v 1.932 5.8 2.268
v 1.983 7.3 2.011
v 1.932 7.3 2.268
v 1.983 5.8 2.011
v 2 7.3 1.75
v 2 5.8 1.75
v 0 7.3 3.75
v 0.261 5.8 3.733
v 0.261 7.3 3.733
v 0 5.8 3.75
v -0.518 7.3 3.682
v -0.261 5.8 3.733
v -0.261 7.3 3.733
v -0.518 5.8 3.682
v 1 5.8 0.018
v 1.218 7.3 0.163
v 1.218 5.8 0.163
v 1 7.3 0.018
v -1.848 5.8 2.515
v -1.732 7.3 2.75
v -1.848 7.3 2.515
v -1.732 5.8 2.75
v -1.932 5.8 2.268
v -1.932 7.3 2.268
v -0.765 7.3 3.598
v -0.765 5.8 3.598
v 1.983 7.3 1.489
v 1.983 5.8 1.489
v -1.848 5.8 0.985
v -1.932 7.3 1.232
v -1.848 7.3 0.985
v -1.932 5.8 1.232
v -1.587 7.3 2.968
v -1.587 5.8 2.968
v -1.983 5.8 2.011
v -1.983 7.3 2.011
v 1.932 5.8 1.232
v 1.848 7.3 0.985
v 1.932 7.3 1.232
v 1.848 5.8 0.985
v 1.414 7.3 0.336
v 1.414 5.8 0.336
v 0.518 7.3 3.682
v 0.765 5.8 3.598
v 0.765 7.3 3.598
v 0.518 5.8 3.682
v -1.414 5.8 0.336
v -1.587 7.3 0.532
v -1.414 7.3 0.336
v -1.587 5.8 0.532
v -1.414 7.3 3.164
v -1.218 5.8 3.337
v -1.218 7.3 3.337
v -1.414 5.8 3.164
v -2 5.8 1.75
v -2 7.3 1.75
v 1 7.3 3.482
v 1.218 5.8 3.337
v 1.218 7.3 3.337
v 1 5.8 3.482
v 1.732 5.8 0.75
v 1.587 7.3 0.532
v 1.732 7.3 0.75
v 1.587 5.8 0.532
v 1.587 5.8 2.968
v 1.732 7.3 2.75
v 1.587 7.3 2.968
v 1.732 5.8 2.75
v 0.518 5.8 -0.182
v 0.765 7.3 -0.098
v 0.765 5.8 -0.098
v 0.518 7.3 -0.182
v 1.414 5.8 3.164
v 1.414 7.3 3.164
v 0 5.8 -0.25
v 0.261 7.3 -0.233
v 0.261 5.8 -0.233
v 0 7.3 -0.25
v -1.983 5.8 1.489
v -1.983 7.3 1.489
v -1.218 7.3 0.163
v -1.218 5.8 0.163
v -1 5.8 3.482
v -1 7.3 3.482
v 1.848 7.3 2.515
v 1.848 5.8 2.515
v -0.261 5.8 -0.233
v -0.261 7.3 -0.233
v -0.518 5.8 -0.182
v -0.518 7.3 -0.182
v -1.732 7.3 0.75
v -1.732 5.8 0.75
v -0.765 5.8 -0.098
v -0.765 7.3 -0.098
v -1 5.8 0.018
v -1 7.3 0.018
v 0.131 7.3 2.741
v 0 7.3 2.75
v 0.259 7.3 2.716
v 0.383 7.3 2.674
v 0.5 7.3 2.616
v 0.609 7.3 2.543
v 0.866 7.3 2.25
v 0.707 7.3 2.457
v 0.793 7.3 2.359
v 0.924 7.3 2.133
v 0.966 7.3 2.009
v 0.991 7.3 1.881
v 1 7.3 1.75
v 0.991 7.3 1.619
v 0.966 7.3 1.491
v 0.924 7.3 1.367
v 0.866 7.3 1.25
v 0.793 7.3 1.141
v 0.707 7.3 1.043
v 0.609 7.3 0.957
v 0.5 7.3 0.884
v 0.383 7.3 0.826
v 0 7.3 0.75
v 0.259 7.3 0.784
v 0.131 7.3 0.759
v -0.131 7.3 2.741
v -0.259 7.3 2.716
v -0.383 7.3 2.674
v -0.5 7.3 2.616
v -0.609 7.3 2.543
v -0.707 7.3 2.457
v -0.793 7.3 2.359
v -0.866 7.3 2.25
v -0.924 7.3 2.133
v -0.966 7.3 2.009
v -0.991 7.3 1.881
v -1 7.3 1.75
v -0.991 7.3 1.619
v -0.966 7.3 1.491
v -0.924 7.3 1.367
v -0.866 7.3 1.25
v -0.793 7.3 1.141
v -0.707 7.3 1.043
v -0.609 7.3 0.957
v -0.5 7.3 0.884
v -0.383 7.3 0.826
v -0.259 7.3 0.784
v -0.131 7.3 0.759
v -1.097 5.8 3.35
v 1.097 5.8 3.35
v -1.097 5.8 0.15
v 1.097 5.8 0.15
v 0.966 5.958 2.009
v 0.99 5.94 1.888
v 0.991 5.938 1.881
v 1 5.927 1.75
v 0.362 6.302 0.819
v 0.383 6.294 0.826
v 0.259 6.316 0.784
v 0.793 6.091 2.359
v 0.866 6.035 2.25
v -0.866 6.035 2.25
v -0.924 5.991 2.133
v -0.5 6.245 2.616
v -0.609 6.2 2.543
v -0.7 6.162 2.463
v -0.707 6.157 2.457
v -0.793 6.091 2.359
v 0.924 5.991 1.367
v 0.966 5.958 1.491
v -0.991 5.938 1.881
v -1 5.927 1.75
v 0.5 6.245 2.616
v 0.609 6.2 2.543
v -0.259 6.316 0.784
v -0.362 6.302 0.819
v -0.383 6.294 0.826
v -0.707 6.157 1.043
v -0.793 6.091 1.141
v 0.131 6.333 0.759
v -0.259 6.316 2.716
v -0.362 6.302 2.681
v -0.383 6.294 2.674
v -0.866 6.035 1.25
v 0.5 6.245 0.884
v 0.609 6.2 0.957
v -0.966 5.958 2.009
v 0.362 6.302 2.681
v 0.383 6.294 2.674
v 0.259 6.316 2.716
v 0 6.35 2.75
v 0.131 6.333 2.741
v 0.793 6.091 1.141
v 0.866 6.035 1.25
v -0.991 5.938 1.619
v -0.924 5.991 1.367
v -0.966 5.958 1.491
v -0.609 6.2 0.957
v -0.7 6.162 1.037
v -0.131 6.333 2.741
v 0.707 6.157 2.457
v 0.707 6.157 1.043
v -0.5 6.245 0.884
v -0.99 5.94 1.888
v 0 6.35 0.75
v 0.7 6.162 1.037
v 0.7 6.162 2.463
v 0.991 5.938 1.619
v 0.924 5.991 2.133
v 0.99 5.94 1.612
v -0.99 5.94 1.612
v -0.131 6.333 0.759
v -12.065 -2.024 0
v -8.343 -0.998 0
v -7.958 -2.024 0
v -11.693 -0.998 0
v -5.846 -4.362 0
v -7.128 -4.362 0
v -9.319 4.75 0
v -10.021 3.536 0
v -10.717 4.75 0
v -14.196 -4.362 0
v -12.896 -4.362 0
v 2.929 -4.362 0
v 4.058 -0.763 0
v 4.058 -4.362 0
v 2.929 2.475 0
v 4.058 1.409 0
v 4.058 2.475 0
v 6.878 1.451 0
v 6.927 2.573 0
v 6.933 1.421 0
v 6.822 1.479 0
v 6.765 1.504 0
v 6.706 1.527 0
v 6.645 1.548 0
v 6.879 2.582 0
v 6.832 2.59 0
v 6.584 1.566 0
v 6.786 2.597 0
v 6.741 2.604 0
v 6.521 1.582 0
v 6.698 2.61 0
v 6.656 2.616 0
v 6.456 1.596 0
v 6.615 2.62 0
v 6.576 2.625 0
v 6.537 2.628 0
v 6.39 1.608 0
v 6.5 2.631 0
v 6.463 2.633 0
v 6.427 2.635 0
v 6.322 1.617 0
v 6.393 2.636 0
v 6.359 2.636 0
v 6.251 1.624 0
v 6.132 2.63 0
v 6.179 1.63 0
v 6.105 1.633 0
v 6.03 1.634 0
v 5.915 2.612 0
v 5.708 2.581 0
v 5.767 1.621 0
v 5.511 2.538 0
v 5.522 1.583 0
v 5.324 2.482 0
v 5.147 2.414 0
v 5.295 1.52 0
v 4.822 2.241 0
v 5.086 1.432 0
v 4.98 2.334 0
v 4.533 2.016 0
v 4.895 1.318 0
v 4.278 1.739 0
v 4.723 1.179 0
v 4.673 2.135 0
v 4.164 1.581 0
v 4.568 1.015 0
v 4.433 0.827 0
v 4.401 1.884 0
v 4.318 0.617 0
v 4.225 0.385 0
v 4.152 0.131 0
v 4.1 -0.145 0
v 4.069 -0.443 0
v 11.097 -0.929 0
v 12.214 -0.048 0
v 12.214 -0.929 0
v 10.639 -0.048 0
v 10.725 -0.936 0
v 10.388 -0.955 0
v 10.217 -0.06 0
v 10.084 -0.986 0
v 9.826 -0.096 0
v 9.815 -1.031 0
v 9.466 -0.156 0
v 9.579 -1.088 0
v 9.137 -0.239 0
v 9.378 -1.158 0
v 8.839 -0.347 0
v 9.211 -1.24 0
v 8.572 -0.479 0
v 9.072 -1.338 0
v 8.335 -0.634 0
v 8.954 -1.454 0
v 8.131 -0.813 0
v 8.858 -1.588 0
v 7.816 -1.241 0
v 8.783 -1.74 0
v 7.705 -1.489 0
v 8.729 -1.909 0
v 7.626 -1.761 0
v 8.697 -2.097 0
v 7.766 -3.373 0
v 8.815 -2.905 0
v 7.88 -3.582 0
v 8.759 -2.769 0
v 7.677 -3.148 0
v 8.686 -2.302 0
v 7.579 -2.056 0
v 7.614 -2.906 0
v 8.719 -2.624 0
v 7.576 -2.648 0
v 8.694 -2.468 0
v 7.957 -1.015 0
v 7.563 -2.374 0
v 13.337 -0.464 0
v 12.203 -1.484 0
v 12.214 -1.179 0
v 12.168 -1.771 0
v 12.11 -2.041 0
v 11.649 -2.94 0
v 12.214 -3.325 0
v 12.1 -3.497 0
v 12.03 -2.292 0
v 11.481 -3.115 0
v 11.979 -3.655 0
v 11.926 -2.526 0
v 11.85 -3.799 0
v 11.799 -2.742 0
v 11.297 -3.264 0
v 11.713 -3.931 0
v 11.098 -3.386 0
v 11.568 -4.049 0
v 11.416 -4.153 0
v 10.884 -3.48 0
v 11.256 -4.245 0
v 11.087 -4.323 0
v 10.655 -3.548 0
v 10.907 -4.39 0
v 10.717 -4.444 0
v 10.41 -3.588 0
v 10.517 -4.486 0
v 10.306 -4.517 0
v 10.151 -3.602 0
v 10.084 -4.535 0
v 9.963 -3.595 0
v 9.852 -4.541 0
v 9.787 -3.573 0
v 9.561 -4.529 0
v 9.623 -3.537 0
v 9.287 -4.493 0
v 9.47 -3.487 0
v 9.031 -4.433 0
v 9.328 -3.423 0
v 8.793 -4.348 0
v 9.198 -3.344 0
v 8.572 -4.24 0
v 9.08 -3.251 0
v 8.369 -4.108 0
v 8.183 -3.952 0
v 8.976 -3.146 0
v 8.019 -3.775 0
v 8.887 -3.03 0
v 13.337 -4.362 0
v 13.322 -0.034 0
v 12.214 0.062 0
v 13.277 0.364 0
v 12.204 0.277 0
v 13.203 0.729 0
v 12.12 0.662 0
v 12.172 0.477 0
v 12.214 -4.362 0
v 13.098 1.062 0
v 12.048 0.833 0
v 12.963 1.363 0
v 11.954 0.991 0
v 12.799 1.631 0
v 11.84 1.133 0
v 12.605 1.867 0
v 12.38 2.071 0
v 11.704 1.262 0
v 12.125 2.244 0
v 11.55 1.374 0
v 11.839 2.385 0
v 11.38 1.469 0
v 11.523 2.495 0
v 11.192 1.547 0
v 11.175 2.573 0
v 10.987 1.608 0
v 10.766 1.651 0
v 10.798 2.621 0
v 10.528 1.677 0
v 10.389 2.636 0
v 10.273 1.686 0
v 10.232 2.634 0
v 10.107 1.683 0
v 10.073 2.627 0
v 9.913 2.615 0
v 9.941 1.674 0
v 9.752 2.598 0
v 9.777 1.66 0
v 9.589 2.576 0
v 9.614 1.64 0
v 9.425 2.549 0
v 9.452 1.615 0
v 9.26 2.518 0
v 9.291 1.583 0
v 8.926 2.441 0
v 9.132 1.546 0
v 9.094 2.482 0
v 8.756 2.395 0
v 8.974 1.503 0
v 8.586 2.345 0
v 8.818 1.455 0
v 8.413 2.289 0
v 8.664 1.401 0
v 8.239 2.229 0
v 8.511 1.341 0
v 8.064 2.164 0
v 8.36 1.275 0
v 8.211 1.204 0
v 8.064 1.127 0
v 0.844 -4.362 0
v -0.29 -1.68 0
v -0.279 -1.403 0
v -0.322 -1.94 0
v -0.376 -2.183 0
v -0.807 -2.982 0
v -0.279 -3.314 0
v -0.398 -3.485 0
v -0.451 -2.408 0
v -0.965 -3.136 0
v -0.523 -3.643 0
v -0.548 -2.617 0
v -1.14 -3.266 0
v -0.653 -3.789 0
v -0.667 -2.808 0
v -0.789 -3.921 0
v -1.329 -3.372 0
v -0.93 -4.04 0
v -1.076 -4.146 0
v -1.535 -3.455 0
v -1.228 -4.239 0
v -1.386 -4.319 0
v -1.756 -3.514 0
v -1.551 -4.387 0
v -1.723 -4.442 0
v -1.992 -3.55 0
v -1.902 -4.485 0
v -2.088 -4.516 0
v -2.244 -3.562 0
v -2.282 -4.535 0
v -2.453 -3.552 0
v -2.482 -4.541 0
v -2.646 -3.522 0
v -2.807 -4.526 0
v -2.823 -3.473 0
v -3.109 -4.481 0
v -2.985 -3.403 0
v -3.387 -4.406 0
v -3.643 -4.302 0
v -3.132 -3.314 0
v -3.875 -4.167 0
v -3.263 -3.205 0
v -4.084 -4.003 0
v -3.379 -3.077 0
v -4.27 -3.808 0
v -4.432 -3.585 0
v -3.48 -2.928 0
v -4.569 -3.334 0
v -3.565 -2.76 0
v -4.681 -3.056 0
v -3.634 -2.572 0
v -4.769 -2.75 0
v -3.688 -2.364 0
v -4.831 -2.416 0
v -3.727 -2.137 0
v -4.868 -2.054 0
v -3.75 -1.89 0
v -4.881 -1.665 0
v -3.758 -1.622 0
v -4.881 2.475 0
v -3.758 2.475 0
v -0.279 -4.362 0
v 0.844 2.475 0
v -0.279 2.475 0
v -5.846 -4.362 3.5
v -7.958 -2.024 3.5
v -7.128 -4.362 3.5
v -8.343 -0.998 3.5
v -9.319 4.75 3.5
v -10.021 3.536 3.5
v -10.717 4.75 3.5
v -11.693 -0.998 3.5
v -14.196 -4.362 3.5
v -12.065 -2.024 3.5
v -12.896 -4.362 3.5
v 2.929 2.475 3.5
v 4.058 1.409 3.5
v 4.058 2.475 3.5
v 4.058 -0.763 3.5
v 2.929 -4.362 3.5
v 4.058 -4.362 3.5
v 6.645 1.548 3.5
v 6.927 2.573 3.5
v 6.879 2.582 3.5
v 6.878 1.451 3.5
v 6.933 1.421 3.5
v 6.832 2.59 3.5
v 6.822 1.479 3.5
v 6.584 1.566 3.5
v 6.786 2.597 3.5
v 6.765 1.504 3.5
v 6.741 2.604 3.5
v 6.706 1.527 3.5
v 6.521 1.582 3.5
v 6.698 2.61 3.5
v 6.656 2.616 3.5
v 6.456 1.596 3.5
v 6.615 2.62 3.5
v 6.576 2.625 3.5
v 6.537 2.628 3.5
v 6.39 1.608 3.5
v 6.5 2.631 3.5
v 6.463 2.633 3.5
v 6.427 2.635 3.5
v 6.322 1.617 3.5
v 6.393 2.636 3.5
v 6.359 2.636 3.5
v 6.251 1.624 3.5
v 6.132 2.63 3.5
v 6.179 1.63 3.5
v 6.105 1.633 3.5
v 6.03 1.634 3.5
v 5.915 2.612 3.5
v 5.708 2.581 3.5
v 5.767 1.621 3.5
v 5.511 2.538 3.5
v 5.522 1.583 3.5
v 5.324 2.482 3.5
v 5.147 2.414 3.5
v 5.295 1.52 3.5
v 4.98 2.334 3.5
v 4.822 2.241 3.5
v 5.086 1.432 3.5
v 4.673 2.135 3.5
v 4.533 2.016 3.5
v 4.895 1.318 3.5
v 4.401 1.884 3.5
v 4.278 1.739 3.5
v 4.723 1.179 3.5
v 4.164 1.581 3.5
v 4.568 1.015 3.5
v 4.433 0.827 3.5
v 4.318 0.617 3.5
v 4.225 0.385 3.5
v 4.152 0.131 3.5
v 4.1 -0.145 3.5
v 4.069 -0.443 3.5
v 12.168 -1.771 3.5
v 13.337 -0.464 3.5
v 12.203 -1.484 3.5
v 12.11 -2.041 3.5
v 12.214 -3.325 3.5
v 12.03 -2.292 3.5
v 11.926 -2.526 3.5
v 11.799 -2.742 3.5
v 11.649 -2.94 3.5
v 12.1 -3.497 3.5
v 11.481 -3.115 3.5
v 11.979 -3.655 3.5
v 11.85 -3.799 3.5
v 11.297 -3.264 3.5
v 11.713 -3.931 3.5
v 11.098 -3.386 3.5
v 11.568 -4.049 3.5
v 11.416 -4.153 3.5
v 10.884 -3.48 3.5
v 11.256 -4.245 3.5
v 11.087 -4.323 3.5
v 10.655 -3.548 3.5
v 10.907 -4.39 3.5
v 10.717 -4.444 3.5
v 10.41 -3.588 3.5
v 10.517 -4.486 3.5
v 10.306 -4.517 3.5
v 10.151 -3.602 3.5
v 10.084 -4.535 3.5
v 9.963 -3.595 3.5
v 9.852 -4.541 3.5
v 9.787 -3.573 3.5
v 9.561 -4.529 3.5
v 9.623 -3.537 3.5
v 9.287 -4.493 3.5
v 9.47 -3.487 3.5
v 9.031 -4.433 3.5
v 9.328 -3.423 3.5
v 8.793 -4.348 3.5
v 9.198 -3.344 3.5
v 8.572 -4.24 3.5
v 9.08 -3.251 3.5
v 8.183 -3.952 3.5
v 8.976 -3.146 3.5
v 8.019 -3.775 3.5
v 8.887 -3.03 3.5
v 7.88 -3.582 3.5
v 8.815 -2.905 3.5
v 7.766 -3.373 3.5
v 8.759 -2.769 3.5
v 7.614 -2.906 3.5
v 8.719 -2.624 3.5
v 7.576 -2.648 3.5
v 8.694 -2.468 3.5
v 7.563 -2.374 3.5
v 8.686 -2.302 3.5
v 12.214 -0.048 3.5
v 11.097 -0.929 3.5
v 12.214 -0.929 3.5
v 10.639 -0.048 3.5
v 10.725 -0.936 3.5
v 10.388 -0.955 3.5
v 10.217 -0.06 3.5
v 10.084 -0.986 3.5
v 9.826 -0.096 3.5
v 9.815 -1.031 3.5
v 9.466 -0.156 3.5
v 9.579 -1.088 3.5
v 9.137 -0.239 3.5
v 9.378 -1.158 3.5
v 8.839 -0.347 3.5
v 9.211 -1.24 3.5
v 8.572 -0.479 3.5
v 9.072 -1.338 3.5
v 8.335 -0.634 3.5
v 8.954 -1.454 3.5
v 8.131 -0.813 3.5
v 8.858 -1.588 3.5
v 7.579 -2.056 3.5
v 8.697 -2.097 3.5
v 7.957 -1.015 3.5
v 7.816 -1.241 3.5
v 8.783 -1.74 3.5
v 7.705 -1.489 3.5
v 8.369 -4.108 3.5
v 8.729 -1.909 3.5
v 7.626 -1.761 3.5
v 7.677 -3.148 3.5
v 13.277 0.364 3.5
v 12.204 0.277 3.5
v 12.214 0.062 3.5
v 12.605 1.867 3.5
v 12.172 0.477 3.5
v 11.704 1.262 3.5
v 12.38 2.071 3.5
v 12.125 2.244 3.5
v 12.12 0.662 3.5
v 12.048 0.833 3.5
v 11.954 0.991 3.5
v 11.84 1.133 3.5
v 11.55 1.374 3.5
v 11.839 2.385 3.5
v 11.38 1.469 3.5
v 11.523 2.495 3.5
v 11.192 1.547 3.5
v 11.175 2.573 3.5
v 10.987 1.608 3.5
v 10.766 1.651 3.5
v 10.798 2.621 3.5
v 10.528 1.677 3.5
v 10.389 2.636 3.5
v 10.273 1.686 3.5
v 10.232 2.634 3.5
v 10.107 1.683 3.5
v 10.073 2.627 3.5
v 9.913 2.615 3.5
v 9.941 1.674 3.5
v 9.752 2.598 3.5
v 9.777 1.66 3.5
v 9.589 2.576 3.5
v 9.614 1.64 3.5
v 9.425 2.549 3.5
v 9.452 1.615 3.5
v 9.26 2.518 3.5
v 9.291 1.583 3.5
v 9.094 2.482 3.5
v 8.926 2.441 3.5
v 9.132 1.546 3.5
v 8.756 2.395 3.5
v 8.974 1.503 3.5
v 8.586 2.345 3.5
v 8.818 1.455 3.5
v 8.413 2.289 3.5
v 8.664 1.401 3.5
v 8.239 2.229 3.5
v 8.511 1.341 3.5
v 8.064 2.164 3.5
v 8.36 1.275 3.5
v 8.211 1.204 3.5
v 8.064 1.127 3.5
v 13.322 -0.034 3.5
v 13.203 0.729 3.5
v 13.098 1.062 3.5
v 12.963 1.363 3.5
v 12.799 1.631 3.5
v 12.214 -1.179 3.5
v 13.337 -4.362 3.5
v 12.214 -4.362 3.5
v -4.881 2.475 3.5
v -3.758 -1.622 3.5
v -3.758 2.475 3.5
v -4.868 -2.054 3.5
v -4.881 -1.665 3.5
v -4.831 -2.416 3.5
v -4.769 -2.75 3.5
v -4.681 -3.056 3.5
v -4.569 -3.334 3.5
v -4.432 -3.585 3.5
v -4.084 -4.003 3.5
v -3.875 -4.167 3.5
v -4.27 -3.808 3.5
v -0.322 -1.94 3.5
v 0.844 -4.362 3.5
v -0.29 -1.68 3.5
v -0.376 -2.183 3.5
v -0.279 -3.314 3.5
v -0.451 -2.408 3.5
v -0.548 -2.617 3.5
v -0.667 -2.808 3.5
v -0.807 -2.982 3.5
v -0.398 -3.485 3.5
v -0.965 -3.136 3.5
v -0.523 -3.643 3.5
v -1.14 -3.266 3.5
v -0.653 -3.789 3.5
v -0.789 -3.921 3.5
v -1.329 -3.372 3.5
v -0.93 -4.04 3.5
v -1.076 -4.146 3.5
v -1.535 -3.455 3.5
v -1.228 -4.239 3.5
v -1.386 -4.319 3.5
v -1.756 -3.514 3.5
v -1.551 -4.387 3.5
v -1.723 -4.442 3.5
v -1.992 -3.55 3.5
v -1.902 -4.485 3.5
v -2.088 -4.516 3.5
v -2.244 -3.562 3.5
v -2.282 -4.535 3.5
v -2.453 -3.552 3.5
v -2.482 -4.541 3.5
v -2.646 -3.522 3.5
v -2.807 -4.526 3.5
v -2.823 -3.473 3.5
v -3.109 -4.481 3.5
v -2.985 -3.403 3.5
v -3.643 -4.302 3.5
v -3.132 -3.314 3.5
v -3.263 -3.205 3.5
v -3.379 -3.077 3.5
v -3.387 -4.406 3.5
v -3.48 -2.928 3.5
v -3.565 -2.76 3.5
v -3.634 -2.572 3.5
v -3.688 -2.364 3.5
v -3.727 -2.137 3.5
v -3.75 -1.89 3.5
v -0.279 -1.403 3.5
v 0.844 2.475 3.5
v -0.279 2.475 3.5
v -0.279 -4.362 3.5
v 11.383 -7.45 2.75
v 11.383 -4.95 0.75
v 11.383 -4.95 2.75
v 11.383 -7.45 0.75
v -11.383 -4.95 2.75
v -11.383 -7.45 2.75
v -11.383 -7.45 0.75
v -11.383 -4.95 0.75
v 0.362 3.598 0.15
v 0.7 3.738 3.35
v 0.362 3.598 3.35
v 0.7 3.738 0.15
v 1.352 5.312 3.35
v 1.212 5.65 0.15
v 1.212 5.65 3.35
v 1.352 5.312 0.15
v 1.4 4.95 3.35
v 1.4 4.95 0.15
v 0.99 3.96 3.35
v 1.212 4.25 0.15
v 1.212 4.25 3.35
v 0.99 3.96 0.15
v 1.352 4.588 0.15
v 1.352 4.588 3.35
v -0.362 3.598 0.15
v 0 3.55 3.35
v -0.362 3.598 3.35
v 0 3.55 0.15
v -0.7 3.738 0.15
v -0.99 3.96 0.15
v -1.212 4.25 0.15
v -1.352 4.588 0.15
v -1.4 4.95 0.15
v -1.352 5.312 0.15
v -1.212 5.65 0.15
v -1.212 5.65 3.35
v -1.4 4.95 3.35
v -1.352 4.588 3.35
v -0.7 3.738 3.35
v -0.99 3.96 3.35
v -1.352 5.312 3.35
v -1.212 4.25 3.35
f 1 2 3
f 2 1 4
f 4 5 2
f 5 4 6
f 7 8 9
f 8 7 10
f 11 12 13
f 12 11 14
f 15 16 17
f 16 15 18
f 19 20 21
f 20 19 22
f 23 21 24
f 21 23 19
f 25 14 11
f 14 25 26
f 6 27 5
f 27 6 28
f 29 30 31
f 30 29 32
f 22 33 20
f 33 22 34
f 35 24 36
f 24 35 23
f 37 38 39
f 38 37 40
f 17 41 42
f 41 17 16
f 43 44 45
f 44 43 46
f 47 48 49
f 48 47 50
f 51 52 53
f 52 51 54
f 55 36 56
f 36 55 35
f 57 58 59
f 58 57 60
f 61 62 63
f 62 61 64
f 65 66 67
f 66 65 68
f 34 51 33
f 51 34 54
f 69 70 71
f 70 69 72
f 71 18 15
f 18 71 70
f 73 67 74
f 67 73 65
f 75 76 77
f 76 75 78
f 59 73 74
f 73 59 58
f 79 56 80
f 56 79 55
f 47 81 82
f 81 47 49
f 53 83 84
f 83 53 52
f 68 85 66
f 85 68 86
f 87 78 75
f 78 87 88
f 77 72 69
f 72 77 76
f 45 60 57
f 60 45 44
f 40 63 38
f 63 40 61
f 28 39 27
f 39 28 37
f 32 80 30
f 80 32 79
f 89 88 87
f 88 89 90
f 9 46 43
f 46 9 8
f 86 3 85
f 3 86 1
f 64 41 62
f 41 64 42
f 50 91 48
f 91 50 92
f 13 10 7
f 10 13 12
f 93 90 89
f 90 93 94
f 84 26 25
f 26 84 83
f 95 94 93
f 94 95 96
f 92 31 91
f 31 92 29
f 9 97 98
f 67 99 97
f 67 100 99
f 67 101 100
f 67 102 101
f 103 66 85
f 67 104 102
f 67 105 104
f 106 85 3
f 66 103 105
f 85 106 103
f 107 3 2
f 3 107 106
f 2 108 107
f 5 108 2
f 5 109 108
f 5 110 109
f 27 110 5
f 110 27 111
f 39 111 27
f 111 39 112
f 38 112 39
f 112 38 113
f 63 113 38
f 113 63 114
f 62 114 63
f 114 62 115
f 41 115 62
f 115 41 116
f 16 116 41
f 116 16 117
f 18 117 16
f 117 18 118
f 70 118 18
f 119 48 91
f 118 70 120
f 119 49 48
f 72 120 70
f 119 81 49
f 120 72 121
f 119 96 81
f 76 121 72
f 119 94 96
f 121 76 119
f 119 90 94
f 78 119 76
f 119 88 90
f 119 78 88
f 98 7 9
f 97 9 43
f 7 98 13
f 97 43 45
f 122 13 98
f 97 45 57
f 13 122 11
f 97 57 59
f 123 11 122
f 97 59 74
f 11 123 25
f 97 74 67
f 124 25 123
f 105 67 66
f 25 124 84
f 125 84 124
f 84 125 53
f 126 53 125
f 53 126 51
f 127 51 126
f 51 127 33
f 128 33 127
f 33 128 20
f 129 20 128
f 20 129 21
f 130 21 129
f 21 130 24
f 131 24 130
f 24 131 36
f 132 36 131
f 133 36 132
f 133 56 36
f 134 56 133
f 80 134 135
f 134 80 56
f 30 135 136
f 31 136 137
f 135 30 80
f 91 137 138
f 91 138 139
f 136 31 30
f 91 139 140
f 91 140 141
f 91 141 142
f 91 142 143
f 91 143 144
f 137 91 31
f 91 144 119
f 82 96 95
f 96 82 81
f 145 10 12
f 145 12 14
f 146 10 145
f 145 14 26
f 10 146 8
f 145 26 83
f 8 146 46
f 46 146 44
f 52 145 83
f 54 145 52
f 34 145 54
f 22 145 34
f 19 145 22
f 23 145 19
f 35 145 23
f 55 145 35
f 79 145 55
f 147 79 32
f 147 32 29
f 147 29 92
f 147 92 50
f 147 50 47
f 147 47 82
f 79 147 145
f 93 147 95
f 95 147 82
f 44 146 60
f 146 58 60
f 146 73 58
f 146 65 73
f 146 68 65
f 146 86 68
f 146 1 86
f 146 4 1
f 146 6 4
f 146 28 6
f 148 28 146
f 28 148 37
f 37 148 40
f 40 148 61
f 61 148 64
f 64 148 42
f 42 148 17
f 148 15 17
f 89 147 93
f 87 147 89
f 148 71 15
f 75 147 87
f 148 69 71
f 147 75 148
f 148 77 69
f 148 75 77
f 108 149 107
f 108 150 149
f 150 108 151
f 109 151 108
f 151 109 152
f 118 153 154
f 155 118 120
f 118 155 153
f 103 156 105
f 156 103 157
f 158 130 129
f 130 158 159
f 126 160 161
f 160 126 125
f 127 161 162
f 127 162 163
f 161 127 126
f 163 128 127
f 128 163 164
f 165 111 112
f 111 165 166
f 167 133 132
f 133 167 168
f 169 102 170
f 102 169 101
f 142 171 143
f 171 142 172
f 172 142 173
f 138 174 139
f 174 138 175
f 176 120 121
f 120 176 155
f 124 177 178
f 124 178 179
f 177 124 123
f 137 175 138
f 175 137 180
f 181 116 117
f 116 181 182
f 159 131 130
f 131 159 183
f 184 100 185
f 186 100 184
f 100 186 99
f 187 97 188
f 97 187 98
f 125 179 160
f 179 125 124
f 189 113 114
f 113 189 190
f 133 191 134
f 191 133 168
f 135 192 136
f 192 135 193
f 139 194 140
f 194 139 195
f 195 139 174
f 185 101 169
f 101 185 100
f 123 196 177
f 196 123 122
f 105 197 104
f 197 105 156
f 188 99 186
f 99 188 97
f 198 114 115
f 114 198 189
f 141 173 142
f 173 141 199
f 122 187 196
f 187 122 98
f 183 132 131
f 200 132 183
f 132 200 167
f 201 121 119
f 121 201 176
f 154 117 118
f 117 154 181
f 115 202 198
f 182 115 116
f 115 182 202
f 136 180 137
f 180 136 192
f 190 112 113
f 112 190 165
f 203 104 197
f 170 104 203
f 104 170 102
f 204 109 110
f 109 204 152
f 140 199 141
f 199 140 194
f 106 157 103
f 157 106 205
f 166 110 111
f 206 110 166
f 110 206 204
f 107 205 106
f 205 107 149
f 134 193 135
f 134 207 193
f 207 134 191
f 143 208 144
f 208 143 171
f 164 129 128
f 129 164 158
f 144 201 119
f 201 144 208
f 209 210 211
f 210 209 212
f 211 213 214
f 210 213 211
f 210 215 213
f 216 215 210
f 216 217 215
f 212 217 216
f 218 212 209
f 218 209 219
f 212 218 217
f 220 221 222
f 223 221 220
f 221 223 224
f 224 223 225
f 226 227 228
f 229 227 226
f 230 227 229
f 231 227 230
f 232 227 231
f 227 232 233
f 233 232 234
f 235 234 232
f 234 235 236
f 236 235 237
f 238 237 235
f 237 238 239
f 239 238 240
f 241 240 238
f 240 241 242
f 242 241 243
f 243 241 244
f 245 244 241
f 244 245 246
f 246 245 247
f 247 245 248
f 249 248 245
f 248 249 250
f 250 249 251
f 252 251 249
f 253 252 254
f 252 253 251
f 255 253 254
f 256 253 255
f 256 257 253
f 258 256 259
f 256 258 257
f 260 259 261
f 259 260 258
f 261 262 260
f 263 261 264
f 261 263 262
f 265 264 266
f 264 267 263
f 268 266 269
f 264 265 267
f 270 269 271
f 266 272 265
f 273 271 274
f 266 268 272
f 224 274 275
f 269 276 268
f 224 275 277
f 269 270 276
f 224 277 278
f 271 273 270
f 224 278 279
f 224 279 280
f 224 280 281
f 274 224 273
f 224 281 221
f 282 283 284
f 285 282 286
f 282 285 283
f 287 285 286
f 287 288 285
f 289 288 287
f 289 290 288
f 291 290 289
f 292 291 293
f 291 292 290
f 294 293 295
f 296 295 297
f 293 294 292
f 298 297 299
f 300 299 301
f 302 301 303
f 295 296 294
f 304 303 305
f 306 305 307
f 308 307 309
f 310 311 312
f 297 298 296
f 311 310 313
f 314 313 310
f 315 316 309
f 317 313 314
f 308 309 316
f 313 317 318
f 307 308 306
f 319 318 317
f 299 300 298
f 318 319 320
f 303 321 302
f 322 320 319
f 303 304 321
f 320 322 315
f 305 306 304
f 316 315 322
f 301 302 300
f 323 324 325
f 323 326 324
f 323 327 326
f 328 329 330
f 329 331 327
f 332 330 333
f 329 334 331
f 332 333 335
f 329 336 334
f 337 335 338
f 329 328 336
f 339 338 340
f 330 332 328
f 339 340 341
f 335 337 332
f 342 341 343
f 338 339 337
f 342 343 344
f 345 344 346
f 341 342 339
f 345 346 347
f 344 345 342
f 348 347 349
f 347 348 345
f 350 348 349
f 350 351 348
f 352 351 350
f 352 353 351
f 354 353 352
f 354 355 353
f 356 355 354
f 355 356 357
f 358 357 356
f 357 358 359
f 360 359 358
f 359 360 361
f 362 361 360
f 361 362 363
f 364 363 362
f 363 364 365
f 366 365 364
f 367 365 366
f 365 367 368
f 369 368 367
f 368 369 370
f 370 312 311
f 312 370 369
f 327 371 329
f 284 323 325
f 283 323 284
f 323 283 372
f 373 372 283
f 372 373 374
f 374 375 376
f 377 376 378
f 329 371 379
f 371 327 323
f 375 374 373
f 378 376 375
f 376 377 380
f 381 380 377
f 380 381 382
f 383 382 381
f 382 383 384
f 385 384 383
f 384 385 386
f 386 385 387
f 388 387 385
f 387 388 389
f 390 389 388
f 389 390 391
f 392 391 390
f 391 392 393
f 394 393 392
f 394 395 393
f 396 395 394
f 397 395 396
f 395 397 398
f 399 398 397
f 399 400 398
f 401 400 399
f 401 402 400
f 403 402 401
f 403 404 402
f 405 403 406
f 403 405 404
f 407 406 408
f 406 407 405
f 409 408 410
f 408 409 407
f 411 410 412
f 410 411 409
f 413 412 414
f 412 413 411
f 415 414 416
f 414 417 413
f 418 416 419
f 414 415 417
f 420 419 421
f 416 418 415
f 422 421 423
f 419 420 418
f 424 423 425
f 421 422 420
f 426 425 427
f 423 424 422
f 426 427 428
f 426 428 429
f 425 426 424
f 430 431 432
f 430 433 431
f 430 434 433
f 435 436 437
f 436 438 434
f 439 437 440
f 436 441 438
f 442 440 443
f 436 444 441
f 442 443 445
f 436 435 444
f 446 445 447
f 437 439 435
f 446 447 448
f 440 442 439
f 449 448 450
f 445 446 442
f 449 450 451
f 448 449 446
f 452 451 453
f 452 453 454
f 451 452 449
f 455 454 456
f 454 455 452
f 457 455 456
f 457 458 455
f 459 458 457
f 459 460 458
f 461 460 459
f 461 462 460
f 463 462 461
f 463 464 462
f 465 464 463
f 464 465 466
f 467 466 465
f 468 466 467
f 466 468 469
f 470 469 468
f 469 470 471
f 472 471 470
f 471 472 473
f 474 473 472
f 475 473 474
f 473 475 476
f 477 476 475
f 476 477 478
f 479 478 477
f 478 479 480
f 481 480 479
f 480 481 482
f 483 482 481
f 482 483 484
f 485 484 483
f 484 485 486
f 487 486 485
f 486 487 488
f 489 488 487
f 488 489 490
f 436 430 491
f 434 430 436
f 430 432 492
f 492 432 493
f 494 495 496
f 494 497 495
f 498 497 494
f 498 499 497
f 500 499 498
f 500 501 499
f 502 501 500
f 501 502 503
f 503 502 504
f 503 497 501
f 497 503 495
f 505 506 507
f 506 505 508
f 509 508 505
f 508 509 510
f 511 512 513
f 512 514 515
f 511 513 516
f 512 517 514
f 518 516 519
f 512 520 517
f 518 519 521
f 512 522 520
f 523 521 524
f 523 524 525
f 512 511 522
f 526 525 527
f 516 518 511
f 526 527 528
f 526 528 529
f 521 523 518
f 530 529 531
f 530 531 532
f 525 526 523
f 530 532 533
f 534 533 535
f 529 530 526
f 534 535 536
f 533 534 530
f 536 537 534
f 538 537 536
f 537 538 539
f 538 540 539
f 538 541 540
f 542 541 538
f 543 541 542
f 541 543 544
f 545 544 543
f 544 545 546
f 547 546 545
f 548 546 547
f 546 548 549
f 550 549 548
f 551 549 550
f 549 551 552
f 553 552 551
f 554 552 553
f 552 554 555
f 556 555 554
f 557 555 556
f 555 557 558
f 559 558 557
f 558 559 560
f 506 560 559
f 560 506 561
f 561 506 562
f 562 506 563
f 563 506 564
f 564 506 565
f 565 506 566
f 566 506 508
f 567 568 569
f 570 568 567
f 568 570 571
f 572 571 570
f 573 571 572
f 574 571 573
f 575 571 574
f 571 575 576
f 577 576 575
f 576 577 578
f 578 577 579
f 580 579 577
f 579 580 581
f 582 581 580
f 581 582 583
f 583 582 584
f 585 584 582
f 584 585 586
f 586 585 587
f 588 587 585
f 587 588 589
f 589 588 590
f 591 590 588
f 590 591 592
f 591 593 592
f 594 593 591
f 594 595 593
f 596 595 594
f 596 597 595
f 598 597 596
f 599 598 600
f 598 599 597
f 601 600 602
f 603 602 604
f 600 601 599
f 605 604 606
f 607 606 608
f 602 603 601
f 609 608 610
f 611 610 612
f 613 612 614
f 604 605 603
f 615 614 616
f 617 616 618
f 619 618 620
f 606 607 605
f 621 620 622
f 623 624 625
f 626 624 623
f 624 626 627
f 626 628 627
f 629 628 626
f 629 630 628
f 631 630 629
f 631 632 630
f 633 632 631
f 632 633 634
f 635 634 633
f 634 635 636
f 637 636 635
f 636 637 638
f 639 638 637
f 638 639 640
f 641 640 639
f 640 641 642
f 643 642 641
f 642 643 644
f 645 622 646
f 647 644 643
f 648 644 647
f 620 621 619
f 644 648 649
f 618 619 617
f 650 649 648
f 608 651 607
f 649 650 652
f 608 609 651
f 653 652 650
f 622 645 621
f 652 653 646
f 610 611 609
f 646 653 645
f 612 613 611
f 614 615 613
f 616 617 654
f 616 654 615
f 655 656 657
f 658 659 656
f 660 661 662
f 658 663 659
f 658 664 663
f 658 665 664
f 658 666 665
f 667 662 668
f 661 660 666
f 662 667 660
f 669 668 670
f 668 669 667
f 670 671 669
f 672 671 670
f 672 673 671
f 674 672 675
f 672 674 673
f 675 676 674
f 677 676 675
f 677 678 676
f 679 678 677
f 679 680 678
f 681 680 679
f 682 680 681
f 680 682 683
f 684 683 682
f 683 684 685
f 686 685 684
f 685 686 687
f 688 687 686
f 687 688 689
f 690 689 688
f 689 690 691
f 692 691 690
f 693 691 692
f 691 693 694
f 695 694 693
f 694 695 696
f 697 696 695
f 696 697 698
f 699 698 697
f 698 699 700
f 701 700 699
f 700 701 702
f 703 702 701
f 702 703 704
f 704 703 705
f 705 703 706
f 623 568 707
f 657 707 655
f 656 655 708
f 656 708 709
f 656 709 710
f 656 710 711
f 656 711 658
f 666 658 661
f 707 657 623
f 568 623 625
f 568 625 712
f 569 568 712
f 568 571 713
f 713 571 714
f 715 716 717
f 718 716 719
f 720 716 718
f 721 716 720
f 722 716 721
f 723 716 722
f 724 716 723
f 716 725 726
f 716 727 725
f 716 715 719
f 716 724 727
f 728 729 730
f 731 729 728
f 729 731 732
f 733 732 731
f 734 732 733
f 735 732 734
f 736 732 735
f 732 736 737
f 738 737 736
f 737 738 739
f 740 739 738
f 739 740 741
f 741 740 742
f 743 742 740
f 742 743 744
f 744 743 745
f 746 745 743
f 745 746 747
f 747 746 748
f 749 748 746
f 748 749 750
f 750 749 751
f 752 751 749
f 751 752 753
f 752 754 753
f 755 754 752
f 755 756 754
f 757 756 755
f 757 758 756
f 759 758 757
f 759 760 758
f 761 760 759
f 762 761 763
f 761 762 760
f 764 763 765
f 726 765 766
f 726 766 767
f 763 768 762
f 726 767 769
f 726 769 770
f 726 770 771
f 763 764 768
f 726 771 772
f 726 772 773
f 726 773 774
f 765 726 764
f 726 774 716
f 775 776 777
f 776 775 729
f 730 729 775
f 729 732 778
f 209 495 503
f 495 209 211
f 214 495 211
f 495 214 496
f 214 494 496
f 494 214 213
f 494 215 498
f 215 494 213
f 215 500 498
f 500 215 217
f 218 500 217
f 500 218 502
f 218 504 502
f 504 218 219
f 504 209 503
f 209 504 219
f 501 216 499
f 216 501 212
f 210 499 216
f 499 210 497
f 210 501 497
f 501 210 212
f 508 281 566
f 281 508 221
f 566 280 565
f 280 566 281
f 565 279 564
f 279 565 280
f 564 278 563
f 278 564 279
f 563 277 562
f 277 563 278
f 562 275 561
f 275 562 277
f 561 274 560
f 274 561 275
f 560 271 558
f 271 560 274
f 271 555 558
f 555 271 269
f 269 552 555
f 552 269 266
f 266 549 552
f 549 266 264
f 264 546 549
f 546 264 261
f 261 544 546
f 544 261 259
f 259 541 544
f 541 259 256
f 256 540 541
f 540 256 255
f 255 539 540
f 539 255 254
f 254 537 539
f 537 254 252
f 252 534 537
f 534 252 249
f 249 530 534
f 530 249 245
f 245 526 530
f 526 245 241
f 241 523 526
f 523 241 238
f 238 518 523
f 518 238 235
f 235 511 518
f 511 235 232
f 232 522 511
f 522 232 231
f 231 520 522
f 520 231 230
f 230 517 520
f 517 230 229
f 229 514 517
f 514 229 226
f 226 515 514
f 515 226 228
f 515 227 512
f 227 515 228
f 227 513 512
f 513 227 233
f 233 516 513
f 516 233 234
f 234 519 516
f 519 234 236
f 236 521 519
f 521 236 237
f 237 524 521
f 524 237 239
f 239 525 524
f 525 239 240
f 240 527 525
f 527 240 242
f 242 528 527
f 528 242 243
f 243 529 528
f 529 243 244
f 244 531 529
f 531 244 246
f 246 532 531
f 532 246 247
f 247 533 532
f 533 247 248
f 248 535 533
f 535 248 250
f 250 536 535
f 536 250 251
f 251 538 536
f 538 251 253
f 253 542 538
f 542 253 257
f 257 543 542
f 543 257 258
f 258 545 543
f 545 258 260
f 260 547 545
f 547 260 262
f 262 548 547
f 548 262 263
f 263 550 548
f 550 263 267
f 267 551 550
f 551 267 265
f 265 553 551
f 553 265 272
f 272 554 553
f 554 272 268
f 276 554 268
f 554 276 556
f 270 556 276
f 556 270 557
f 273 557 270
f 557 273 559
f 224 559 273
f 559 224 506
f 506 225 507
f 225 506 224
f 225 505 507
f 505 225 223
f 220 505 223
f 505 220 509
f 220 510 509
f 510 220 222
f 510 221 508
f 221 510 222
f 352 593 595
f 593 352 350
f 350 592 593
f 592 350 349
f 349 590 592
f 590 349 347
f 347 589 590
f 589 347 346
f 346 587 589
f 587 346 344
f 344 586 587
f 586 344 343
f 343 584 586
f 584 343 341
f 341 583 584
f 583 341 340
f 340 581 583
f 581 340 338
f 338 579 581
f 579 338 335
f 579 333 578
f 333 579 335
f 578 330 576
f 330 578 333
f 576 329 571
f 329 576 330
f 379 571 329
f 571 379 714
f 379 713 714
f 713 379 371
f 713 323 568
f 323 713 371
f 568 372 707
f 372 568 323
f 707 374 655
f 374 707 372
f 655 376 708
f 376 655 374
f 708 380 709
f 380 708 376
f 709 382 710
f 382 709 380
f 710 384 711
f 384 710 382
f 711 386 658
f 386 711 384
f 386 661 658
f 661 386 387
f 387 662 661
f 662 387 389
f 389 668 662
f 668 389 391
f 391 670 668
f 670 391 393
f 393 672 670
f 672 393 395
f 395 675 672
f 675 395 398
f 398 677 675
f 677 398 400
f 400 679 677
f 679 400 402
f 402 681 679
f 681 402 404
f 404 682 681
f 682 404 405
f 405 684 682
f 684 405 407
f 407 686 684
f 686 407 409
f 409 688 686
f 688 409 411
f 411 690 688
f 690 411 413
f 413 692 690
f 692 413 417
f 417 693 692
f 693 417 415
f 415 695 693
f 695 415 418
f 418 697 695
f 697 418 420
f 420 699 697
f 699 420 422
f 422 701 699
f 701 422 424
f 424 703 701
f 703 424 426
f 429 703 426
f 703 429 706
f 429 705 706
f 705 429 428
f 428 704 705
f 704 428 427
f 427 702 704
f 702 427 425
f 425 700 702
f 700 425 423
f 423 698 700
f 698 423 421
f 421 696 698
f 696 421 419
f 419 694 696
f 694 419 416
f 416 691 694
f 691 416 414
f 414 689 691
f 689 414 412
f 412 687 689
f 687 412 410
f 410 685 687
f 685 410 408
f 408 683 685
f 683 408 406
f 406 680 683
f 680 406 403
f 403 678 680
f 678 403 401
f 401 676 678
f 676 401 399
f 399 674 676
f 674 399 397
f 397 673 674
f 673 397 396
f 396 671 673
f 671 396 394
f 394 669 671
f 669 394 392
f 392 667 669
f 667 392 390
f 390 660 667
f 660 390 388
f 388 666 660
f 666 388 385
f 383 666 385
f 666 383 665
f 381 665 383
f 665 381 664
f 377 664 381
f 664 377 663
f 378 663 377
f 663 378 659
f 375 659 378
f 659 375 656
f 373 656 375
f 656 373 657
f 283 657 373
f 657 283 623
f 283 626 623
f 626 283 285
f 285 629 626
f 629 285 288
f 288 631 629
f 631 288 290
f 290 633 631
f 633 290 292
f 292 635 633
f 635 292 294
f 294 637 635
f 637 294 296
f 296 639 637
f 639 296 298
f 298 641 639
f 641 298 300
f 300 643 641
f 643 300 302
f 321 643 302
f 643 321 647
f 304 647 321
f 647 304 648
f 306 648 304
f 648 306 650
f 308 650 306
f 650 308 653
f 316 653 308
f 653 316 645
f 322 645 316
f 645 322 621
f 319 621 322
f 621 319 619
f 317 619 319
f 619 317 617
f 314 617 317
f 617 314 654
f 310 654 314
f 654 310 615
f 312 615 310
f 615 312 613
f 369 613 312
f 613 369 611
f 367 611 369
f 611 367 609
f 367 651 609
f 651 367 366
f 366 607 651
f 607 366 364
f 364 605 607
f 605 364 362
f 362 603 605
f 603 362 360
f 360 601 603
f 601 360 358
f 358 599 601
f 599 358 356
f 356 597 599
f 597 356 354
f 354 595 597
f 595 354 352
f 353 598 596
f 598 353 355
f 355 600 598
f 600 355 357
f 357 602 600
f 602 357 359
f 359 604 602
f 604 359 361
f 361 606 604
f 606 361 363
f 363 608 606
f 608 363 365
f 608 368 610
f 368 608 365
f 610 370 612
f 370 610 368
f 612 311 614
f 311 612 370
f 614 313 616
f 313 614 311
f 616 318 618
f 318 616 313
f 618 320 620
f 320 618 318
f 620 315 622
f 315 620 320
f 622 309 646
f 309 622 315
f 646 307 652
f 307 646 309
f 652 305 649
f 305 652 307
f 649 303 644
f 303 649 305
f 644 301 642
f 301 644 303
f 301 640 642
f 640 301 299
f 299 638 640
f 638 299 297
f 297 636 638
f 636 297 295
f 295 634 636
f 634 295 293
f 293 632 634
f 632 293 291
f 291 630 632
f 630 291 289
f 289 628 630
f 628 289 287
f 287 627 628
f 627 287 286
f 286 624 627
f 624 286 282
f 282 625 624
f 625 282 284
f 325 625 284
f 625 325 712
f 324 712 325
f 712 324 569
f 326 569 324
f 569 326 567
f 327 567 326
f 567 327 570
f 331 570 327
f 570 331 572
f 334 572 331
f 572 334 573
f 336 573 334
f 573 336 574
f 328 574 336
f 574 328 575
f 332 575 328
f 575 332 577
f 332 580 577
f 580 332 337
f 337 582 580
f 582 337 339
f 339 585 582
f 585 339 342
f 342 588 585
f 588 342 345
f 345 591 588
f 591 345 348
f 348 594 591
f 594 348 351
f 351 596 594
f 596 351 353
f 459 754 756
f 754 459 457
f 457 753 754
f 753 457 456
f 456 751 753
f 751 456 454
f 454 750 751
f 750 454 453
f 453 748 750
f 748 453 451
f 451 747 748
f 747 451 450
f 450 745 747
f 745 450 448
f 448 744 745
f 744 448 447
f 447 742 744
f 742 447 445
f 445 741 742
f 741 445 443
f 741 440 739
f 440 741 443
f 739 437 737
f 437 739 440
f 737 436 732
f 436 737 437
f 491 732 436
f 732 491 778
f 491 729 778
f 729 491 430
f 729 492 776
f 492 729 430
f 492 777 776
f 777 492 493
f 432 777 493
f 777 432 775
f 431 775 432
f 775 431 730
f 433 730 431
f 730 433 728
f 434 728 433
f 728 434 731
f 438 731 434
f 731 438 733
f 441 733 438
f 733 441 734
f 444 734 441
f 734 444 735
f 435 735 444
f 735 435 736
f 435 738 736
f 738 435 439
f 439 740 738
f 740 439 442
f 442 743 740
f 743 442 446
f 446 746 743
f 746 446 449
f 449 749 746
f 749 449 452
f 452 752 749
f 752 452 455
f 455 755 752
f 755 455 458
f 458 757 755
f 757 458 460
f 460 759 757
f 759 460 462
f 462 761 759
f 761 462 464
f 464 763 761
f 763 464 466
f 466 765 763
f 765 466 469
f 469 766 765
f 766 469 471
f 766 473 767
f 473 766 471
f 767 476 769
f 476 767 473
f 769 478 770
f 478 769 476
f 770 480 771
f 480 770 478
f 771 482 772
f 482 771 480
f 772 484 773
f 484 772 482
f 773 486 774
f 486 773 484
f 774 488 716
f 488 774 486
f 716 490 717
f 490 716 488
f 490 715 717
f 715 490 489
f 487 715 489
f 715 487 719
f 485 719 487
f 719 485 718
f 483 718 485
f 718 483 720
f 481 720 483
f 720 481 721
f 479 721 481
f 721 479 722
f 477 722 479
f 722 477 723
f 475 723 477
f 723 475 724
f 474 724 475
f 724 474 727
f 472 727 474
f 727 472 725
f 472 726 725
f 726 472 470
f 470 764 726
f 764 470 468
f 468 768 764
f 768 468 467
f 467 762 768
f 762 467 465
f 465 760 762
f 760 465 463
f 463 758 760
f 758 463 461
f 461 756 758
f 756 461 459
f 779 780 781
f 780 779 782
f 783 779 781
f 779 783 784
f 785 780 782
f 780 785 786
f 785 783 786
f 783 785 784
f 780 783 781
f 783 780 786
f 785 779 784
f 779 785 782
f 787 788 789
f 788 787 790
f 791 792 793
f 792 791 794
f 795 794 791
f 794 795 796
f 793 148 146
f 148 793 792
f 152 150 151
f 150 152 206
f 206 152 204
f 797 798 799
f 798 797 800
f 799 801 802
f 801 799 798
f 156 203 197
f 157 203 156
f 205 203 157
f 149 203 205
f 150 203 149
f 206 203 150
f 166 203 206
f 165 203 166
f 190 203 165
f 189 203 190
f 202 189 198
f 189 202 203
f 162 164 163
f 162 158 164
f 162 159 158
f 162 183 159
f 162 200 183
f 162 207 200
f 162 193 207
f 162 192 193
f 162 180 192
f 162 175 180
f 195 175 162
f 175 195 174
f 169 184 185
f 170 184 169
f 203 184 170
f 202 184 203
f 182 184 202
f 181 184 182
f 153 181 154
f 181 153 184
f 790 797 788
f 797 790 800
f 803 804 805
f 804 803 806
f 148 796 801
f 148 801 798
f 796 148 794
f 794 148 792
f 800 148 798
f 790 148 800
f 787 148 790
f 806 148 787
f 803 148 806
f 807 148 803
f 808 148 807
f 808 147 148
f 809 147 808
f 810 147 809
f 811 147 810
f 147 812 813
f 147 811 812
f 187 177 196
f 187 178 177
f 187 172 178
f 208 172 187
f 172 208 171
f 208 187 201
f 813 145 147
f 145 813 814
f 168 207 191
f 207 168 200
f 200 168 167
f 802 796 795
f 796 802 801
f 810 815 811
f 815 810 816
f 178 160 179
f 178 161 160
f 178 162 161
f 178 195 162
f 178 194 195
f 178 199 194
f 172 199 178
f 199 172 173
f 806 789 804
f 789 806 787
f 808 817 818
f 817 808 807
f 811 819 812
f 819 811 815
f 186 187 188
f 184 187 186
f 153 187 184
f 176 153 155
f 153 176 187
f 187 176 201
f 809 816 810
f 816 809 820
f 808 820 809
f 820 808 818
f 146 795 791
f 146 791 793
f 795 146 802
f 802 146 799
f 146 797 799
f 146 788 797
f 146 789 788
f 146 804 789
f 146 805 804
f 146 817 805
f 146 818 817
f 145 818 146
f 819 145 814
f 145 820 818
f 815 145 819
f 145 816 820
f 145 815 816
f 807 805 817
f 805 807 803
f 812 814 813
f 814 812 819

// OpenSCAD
// ============================================================
// pendant.scad — Name Necklace Pendant (NO backing plate)
// Design: extruded name text + thin base spine + bail ring
//
// Called headlessly via xvfb-run:
//   openscad -o out.stl pendant.scad -D 'NAME="Sara"' -D 'FONT="Pacifico"'
// ============================================================

// Parameters
NAME          = "Aura";
FONT          = "Pacifico";   // "Pacifico" | "Cinzel:style=Regular" | "Dancing Script:style=Regular" | "Bebas Neue:style=Regular"
TEXT_SIZE_MM  = 9;            // Font size in mm — width auto-scales in STL viewer
TEXT_DEPTH_MM = 3.5;          // Extrusion depth — thick/solid for jewelry casting
BEVEL_MM      = 0.3;          // Edge bevel

SPINE_H_MM    = 2.5;          // Base spine height connecting all letters
SPINE_T_MM    = 2.0;          // Spine thickness (same as text depth)

BAIL_OUTER_R  = 2.0;          // Bail ring outer radius (mm)
BAIL_INNER_R  = 1.0;          // Bail ring inner radius
BAIL_THICK    = 1.5;          // Bail tube thickness

// ─── Modules ───────────────────────────────────────────────────

// The name extruded
module name_text() {
    linear_extrude(height = TEXT_DEPTH_MM, convexity = 10)
        text(NAME, size = TEXT_SIZE_MM, font = FONT,
             halign = "center", valign = "center", $fn = 48);
}

// Thin spine at the bottom — connects all letter islands
module base_spine(text_w, text_h) {
    spine_w = text_w * 1.02;
    translate([0, -(text_h / 2 + SPINE_H_MM / 2), TEXT_DEPTH_MM / 2])
    cube([spine_w, SPINE_H_MM, SPINE_T_MM], center = true);
}

// Bail ring above the text
module bail(text_h) {
    bail_y = text_h / 2 + BAIL_OUTER_R * 0.8;
    translate([0, bail_y, TEXT_DEPTH_MM / 2])
    rotate([90, 0, 0])
    difference() {
        cylinder(r = BAIL_OUTER_R, h = BAIL_THICK, center = true, $fn = 48);
        cylinder(r = BAIL_INNER_R, h = BAIL_THICK + 0.2, center = true, $fn = 48);
    }
}

// Neck pillar: plate top → bail
module bail_neck(text_h) {
    neck_y = text_h / 2;
    neck_z  = TEXT_DEPTH_MM / 2;
    translate([0, neck_y, neck_z])
        cylinder(r = BAIL_INNER_R * 1.4, h = BAIL_OUTER_R * 1.6, center = true, $fn = 24);
}

// ─── Assembly ──────────────────────────────────────────────────
//
// Estimate text bounding box (approximation — exact size depends on font)
// text_w ≈ number_of_chars × 6mm;  text_h ≈ TEXT_SIZE_MM
text_w_approx = len(NAME) * TEXT_SIZE_MM * 0.62;
text_h_approx = TEXT_SIZE_MM * 1.1;

union() {
    // 1. Extruded name
    name_text();

    // 2. Base spine connecting all letters
    base_spine(text_w_approx, text_h_approx);

    // 3. Bail
    bail(text_h_approx);

    // 4. Neck connector
    bail_neck(text_h_approx);
}
